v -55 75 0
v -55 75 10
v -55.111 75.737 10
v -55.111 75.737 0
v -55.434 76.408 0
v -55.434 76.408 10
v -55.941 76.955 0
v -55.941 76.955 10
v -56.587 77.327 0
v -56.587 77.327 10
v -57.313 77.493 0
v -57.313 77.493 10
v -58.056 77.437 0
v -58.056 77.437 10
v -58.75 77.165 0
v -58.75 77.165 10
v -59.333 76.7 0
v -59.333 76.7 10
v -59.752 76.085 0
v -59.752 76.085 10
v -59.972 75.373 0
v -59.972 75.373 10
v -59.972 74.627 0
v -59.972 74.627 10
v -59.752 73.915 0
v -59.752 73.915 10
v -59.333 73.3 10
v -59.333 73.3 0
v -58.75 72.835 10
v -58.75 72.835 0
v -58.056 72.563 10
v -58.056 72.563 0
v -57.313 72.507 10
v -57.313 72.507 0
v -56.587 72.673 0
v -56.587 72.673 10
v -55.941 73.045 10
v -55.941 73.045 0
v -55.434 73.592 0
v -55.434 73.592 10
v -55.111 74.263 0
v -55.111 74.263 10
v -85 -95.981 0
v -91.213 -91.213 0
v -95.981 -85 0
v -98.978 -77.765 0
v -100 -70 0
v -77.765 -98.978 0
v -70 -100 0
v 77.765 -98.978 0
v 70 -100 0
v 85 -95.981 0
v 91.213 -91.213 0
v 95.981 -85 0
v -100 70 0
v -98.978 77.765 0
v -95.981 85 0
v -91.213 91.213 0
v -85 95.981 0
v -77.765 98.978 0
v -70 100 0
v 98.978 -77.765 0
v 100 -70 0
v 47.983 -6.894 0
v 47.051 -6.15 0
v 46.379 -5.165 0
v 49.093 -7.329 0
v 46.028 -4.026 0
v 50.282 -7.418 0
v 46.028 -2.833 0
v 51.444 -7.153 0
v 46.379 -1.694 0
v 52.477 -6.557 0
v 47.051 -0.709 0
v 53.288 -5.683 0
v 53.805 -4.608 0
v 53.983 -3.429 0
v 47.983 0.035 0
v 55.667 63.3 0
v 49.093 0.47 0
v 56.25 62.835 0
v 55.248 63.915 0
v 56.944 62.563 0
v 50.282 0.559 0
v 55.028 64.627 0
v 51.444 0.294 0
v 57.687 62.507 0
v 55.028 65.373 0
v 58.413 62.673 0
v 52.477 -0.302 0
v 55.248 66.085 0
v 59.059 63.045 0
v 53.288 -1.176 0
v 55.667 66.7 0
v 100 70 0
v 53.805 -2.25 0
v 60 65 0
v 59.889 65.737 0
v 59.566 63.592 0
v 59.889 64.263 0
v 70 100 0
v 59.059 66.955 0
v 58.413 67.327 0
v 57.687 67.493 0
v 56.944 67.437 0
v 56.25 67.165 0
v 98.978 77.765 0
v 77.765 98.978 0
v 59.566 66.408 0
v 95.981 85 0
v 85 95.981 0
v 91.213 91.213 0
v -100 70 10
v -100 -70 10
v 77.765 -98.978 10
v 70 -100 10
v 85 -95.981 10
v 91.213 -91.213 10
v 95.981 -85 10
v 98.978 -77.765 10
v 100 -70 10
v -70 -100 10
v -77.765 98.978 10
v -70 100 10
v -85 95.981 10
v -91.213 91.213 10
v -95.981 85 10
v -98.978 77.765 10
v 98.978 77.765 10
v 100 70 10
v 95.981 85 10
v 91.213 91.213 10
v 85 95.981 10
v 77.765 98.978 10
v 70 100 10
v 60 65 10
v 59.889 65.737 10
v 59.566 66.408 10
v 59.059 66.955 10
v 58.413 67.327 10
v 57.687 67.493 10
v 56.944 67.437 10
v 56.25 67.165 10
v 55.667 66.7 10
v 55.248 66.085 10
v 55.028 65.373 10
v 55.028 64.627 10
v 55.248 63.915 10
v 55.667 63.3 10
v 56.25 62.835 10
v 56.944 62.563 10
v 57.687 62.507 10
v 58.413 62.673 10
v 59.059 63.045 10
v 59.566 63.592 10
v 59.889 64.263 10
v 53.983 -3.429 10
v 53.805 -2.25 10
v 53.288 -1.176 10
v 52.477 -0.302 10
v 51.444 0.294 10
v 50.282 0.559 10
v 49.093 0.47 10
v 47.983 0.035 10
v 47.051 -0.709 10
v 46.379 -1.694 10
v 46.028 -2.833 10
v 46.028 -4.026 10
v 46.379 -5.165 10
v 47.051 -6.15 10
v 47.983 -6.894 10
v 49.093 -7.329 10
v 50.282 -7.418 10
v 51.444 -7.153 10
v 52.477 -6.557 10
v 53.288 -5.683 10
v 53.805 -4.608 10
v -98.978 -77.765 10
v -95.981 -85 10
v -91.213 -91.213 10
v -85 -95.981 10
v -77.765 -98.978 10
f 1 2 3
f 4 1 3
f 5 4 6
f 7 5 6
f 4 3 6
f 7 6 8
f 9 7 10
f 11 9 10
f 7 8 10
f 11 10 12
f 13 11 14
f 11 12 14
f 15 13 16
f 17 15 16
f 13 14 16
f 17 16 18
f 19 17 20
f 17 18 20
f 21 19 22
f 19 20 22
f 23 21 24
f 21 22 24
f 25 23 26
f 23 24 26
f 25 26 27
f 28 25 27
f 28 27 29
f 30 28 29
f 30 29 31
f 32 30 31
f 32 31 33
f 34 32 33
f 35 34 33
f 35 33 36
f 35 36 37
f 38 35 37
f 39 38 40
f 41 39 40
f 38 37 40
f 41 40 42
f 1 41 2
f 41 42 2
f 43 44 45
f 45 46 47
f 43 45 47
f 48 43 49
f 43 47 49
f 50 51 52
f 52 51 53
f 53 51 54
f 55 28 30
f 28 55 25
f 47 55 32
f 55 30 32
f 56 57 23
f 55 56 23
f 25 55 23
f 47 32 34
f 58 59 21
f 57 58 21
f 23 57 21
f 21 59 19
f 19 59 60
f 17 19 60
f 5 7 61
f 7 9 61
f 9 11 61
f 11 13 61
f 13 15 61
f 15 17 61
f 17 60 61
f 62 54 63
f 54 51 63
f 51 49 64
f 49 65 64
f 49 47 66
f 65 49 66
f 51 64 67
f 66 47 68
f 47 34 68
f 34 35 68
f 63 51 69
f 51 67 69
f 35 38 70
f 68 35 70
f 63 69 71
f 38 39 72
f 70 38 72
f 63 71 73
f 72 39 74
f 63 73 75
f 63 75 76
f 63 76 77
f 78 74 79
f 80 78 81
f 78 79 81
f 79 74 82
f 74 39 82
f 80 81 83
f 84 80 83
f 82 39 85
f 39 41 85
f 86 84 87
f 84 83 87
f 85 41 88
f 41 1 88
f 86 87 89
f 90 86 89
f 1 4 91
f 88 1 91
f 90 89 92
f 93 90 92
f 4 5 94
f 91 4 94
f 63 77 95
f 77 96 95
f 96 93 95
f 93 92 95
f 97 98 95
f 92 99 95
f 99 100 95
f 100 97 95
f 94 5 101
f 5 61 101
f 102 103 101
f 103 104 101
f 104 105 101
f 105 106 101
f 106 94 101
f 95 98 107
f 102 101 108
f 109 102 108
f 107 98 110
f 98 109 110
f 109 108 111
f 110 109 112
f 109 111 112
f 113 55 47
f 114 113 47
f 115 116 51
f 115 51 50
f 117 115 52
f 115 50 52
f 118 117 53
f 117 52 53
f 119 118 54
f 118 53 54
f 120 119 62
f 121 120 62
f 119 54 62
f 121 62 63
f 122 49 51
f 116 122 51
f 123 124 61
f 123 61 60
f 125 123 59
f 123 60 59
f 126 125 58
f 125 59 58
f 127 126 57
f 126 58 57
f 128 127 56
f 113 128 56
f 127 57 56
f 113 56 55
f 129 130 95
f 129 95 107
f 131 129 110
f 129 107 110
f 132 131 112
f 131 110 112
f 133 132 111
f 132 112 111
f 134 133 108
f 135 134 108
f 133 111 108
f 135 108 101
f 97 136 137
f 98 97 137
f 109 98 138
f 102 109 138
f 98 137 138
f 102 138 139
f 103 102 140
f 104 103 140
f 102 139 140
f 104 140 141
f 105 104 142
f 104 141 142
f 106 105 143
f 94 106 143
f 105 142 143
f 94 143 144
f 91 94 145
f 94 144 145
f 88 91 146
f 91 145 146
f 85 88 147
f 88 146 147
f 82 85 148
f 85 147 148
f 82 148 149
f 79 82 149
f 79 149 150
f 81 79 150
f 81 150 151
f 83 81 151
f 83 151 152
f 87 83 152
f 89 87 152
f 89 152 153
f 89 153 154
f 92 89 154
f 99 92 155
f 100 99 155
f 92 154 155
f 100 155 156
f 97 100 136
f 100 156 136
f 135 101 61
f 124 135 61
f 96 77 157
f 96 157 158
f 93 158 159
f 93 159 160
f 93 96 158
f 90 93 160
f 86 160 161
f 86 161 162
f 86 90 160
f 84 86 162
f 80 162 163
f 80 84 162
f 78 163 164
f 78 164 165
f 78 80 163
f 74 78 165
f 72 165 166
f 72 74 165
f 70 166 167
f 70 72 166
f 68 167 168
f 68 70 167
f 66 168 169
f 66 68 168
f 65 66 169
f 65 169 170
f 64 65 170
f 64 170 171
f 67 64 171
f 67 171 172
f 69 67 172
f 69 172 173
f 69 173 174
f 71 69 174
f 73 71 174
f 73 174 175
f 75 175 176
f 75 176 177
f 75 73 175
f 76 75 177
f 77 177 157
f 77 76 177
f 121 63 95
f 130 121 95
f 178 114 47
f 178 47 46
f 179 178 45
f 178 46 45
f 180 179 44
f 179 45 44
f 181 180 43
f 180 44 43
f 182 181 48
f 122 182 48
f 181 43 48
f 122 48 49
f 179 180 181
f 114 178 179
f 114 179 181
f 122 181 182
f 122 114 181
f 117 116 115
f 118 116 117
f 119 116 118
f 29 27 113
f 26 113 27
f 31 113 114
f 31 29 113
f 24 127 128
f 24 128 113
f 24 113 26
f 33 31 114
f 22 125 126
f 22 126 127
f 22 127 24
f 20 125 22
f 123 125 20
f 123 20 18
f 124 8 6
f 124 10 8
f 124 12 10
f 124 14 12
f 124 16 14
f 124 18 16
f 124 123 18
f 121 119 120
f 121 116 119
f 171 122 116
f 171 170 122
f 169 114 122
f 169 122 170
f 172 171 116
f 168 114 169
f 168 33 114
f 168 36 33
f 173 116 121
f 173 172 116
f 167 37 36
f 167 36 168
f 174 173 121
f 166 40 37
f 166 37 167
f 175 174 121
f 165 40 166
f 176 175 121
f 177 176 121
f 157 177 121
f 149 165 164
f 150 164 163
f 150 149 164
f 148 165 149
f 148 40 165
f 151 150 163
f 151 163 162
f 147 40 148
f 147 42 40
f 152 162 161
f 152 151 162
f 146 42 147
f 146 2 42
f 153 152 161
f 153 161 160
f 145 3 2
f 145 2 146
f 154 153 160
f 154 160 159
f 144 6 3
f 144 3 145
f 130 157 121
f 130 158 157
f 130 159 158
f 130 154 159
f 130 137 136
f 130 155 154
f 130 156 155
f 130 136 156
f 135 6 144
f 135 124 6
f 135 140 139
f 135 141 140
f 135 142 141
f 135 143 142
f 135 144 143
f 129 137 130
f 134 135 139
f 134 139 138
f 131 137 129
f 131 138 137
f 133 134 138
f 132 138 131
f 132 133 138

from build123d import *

# Parameters (mm, degrees)
SKETCH1_R               = 4
BOSS_EXTRUDE1_DEPTH     = 10
SKETCH2_R               = 2.5
CUT_EXTRUDE1_DEPTH      = 1
CUT_EXTRUDE1_DEPTH_BACK = 10


with BuildPart() as part:
    # Sketch1 → Boss-Extrude1 (new body)
    with BuildSketch(Plane.XY):
        with BuildLine():
            Line((-70, -100), (70, -100))
            ThreePointArc((70, -100), (91.213203436, -91.213203436), (100, -70))
            Line((100, -70), (100, 70))
            ThreePointArc((100, 70), (91.213203436, 91.213203436), (70, 100))
            Line((70, 100), (-70, 100))
            ThreePointArc((-70, 100), (-91.213203436, 91.213203436), (-100, 70))
            Line((-100, 70), (-100, -70))
            ThreePointArc((-100, -70), (-91.213203436, -91.213203436), (-70, -100))
        make_face()
        with Locations((49.983002612, -3.429415932)):
            Circle(SKETCH1_R, mode=Mode.SUBTRACT)
    extrude(amount=BOSS_EXTRUDE1_DEPTH)

    # Sketch2 → Cut-Extrude1 (cut, two sides)
    with BuildSketch(Plane.XY.offset(10)) as cut_extrude1_sk:
        with Locations((-57.5, 75)):
            Circle(SKETCH2_R)
        with Locations((57.5, 65)):
            Circle(SKETCH2_R)
    extrude(amount=CUT_EXTRUDE1_DEPTH, mode=Mode.SUBTRACT)
    extrude(cut_extrude1_sk.sketch, amount=-CUT_EXTRUDE1_DEPTH_BACK, mode=Mode.SUBTRACT)


solid = part.part
